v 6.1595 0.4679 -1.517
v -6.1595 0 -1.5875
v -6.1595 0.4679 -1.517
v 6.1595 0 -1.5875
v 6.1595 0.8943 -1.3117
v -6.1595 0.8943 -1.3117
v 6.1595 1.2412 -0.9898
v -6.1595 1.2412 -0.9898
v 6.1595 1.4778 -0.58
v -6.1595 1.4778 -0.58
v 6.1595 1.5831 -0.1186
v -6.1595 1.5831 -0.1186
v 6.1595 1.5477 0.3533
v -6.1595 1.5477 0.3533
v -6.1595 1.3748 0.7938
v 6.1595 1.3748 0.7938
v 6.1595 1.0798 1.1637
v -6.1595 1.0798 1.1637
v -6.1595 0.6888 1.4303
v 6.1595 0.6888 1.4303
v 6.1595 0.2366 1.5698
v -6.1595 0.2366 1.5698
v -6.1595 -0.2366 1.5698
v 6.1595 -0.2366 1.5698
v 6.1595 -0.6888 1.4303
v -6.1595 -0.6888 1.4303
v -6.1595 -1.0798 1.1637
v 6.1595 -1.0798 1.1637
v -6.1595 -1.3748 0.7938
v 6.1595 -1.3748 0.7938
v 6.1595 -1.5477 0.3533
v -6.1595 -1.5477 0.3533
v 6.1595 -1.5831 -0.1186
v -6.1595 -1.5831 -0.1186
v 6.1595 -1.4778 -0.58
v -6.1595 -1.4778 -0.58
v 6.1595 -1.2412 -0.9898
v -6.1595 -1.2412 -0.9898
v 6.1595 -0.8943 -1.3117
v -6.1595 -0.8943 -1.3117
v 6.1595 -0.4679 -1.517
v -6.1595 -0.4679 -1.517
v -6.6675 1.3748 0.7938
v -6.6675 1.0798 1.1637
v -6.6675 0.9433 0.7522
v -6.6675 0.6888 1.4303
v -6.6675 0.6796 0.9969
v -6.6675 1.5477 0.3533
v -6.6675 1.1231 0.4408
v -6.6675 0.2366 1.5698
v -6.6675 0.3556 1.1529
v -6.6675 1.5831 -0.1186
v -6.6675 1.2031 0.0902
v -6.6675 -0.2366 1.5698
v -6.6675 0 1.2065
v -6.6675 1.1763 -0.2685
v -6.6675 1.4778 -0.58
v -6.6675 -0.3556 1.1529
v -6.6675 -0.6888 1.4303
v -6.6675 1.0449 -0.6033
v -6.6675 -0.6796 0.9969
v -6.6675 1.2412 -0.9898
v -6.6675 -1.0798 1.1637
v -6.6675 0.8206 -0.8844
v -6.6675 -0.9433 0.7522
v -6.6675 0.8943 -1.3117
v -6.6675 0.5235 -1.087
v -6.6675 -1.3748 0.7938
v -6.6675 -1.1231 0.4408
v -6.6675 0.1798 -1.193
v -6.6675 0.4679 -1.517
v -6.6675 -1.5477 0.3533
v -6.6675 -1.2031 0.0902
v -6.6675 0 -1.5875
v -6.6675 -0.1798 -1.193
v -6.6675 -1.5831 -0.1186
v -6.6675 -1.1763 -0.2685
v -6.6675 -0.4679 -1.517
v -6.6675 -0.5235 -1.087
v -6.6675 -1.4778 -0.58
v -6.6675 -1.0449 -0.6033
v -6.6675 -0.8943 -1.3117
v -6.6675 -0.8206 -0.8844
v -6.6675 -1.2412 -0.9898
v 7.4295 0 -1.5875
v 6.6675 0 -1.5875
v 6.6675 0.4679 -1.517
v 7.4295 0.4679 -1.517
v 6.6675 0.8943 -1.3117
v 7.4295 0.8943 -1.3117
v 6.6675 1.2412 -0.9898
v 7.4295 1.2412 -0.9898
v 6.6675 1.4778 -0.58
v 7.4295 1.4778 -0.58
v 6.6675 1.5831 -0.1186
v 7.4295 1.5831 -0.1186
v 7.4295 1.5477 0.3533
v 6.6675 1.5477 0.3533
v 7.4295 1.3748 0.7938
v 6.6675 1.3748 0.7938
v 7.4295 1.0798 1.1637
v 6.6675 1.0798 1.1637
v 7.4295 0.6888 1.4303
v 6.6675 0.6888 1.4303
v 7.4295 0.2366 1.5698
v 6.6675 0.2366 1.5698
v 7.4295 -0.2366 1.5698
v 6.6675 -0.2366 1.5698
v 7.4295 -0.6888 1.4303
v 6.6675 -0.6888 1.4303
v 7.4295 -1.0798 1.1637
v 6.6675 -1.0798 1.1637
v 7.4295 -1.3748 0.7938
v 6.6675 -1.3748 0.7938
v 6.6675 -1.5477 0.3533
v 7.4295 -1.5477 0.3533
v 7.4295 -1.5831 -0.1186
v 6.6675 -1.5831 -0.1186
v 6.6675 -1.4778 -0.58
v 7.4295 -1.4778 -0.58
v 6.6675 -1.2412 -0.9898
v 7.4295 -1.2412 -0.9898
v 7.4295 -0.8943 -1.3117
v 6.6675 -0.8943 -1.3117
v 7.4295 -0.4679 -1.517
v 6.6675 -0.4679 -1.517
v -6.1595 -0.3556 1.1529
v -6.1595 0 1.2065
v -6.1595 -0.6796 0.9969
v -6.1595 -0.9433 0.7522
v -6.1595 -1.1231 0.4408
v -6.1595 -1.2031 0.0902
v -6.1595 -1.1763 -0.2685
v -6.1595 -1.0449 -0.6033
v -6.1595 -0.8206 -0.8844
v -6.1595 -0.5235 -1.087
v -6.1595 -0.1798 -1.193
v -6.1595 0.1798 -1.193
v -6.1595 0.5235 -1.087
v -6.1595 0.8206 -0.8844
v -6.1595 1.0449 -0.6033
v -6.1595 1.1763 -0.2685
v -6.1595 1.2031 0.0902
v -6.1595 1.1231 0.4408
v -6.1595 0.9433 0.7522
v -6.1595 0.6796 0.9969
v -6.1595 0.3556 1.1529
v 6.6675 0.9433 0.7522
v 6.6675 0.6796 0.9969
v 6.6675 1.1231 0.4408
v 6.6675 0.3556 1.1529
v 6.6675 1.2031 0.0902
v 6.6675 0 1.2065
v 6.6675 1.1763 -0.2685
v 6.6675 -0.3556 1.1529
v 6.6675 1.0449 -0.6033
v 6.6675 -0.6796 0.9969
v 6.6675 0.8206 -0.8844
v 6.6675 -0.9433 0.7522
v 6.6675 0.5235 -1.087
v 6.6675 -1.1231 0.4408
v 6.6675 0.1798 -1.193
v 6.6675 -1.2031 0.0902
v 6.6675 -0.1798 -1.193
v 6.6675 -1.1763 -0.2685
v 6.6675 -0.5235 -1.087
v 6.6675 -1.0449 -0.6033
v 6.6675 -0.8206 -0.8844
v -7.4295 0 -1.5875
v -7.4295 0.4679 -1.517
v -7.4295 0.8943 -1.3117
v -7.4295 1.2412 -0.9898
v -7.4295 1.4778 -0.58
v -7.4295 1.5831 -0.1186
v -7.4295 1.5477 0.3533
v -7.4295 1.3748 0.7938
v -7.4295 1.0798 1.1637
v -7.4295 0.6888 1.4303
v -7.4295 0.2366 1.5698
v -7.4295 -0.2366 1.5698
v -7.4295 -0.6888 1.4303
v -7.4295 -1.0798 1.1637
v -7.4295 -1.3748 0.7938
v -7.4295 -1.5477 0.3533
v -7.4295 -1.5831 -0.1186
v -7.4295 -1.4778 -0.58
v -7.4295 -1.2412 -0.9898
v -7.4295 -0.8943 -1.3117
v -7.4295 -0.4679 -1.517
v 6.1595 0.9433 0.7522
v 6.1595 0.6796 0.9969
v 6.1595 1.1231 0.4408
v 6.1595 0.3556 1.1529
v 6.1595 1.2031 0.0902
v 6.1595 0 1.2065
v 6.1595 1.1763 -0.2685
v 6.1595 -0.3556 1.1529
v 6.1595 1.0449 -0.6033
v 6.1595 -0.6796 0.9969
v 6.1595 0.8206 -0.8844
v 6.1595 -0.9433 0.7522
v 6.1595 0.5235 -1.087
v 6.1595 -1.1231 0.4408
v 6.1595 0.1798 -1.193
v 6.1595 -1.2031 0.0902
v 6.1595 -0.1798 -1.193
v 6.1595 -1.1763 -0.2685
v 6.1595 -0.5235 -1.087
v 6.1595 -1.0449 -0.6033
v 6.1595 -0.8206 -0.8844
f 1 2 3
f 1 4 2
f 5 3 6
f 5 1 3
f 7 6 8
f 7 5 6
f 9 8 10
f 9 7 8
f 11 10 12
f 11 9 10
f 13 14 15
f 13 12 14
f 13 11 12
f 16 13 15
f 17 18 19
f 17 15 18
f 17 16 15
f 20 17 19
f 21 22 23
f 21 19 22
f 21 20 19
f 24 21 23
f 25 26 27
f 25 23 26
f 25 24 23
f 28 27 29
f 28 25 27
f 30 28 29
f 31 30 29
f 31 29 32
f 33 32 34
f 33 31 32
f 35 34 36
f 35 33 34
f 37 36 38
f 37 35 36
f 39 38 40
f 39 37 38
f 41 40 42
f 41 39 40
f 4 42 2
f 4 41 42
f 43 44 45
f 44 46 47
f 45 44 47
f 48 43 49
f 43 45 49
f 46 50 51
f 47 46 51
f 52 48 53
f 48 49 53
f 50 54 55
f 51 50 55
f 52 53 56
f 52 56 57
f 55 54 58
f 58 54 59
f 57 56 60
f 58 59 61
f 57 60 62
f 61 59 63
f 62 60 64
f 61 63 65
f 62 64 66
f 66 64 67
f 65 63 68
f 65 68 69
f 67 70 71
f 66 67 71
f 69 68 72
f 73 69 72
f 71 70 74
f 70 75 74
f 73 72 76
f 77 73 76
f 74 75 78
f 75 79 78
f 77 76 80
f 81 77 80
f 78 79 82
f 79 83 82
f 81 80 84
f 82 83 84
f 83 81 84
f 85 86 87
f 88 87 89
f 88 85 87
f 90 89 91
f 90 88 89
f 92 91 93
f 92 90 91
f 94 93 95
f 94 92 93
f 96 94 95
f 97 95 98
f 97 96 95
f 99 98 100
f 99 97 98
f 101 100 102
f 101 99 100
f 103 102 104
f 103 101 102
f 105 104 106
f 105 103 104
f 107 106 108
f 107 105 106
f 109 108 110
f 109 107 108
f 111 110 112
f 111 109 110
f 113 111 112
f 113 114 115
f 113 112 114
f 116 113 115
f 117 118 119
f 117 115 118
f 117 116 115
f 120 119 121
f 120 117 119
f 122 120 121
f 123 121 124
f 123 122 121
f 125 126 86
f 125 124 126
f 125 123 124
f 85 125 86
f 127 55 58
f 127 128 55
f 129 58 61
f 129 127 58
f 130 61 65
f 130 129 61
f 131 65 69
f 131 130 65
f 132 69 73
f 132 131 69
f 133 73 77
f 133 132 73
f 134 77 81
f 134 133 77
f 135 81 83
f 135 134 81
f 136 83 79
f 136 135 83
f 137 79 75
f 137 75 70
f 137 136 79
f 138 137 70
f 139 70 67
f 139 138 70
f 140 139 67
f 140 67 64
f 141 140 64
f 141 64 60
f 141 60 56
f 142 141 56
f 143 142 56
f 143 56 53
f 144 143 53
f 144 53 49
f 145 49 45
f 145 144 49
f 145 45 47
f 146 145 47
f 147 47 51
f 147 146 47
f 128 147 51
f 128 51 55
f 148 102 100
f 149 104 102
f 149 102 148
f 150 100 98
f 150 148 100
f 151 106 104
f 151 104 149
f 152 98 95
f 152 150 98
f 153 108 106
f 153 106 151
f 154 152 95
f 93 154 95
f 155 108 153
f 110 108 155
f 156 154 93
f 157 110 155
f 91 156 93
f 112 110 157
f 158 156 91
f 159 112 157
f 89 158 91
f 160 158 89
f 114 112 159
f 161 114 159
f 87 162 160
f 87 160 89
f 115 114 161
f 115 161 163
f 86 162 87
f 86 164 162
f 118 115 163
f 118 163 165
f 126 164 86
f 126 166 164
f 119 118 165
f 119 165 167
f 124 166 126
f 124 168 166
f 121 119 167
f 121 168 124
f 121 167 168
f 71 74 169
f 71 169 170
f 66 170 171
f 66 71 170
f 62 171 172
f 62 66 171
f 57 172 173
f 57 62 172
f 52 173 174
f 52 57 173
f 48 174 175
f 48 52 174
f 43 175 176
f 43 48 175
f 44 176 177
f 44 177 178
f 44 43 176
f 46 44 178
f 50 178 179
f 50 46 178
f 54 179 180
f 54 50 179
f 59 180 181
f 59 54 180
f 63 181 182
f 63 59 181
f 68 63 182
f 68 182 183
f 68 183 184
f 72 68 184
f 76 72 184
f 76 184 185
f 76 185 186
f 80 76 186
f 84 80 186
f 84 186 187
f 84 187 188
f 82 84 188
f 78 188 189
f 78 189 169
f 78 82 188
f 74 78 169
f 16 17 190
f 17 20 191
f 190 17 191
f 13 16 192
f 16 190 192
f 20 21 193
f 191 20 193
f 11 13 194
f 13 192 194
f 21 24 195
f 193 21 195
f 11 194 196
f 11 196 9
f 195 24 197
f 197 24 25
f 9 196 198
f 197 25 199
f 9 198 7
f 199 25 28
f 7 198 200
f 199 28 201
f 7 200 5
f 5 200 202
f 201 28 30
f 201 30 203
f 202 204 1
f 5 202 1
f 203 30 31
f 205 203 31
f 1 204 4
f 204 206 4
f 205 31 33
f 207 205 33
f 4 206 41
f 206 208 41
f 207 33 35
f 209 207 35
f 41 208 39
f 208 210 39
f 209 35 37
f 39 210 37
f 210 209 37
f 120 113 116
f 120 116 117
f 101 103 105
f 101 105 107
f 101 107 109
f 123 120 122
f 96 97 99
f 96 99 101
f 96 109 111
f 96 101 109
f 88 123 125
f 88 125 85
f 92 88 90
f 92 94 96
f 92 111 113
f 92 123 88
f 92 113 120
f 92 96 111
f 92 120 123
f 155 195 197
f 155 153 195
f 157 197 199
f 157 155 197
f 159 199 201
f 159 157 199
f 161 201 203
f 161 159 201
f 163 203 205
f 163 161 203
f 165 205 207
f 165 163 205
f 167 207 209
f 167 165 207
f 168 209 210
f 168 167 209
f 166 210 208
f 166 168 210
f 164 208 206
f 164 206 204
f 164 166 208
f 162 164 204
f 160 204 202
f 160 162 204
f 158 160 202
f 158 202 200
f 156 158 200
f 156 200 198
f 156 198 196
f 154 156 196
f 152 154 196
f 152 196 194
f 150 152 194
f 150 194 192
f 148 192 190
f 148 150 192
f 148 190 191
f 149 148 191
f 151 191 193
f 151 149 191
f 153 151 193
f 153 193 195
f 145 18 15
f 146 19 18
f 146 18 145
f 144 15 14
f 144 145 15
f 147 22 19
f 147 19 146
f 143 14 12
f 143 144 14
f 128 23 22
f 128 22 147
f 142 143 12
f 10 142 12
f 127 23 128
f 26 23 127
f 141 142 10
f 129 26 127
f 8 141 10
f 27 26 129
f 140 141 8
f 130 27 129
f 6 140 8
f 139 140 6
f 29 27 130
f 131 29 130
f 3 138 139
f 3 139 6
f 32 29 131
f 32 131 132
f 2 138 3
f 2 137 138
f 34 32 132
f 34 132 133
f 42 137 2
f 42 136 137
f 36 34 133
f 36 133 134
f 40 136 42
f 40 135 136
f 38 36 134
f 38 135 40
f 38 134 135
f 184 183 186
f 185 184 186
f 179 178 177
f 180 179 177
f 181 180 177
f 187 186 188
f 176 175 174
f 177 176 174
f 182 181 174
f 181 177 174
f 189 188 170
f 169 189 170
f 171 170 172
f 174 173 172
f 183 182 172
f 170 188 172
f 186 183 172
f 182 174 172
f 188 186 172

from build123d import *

# Parameters (mm, degrees)
SKETCH1_R      = 1.5875
EXTRUDE1_DEPTH = 7.4295
SKETCH2_W      = 0.508
SKETCH2_H      = 0.381


with BuildPart() as part:
    # Sketch1 → Extrude1 (new, symmetric)
    with BuildSketch(Plane(origin=(0, 0, 0), x_dir=(0, 0, -1), z_dir=(1, 0, 0))):
        Circle(SKETCH1_R)
    extrude(amount=EXTRUDE1_DEPTH, both=True)

    # Sketch2 → Cut-Revolve1 (revolve, cut)
    with BuildSketch(Plane.XY):
        with Locations((-6.4135, 1.397)):
            Rectangle(SKETCH2_W, SKETCH2_H)
        with Locations((6.4135, 1.397)):
            Rectangle(SKETCH2_W, SKETCH2_H)
    revolve(axis=Axis((-7.4295, 0, 0), (1, 0, 0)), mode=Mode.SUBTRACT)


solid = part.part
